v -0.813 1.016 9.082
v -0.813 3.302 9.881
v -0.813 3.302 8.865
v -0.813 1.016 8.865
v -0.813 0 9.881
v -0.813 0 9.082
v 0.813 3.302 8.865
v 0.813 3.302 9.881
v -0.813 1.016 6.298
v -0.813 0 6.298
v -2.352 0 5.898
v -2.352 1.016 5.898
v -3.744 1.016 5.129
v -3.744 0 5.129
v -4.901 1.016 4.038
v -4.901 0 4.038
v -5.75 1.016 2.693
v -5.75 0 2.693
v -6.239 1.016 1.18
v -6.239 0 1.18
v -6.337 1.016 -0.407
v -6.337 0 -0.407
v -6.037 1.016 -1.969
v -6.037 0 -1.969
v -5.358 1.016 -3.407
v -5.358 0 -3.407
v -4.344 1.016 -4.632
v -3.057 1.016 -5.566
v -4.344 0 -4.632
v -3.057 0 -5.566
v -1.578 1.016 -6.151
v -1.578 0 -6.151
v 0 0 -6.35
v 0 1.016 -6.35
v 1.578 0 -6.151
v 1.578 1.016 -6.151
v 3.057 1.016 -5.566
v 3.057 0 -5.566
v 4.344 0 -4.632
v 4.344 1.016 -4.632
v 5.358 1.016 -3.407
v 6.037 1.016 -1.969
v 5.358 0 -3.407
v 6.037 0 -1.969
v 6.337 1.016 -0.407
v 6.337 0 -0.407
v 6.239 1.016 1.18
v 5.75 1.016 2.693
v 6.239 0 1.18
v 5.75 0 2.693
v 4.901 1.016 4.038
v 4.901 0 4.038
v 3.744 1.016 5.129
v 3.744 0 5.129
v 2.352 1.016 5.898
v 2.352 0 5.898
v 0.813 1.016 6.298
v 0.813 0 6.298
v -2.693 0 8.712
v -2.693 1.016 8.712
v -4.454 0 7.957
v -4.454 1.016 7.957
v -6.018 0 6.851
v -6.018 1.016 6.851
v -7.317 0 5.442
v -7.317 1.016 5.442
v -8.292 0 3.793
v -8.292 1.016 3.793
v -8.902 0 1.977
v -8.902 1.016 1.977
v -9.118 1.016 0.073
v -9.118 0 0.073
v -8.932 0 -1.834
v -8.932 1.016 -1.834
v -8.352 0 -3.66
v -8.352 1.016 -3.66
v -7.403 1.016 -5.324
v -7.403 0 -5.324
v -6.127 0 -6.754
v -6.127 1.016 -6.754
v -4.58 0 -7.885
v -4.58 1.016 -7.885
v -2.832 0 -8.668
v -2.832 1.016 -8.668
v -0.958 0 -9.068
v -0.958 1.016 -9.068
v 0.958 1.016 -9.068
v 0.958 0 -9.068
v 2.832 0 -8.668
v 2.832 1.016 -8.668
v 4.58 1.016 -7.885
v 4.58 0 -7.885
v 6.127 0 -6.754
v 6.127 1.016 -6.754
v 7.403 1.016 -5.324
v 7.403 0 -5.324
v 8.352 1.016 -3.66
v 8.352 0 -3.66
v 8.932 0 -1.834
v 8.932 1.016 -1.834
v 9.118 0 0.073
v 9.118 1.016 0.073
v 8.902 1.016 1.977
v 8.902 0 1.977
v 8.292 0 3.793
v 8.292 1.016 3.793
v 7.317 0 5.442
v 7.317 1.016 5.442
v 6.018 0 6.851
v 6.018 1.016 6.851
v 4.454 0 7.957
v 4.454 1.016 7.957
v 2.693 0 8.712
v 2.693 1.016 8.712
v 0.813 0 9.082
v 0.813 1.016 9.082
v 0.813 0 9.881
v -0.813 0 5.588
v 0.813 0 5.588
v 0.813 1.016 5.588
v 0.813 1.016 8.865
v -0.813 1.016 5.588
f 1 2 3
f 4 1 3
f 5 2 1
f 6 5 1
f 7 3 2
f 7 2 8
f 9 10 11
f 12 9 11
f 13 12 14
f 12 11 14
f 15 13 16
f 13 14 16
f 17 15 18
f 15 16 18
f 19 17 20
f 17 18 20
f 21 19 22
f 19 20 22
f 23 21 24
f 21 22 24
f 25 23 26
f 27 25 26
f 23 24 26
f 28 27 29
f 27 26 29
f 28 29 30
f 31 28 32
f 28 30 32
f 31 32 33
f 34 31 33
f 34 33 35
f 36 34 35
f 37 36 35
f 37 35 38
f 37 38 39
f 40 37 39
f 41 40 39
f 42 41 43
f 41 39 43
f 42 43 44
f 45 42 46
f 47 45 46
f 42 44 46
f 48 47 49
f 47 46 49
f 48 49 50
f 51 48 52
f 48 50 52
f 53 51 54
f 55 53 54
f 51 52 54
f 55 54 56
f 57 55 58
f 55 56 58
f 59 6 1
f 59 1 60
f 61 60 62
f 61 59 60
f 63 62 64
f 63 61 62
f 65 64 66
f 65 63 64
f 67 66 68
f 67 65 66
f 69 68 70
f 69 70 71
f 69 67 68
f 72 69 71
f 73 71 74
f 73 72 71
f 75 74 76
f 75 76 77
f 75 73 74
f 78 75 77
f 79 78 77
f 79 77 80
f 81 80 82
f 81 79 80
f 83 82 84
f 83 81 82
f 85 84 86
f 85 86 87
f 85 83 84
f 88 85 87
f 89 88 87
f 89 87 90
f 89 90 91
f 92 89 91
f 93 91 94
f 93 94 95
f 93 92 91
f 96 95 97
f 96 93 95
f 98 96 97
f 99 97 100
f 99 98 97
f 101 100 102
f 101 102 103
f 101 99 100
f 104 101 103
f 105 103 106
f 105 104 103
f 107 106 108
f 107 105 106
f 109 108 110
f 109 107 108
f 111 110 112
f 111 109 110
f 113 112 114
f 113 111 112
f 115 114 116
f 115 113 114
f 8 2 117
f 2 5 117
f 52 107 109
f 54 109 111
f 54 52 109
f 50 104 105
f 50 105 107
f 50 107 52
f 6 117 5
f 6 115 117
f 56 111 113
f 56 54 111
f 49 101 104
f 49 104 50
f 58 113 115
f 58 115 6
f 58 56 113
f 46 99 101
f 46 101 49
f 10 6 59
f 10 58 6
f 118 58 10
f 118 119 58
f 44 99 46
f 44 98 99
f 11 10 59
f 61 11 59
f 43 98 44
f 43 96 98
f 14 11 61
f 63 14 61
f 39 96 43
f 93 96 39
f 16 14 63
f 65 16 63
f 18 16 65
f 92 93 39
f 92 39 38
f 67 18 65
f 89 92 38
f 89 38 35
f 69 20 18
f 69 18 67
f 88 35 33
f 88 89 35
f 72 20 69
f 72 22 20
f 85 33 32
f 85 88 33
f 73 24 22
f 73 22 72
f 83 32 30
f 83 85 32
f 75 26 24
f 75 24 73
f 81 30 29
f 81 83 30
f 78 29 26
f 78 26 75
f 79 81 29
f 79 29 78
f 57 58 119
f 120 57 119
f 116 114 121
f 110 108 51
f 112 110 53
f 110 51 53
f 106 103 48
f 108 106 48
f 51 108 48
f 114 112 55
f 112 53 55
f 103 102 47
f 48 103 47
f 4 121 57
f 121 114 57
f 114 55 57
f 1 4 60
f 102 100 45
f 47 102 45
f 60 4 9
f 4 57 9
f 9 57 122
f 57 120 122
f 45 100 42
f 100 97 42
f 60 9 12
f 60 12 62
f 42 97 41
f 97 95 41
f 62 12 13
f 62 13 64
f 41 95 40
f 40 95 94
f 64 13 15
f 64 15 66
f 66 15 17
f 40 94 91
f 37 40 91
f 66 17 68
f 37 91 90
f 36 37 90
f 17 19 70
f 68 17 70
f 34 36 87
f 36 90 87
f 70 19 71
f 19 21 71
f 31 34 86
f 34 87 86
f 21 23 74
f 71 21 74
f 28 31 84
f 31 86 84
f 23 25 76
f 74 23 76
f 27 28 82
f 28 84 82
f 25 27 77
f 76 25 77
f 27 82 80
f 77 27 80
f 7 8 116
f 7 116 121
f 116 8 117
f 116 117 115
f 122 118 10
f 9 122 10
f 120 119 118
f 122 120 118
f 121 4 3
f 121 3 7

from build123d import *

# Parameters (mm, degrees)
BOSS_EXTRUDE1_DEPTH = 1.016
SKETCH2_W           = 1.6256
SKETCH2_H           = 1.016
BOSS_EXTRUDE2_DEPTH = 2.286


with BuildPart() as part:
    # Sketch1 → Boss-Extrude1 (new body)
    with BuildSketch(Plane(origin=(0, 0, 0), x_dir=(1, 0, 0), z_dir=(0, 1, 0))):
        with BuildLine():
            Line((0.8128, -9.8806), (-0.8128, -9.8806))
            Line((-0.8128, -9.8806), (-0.8128, -9.082302688))
            ThreePointArc((-0.8128, -9.082302688), (0, 9.1186), (0.8128, -9.082302688))
            Line((0.8128, -9.082302688), (0.8128, -9.8806))
        make_face()
        with BuildLine():
            Line((0.8128, -6.297765966), (0.8128, -5.588))
            Line((0.8128, -5.588), (-0.8128, -5.588))
            Line((-0.8128, -5.588), (-0.8128, -6.297765966))
            ThreePointArc((-0.8128, -6.297765966), (0, 6.35), (0.8128, -6.297765966))
        make_face(mode=Mode.SUBTRACT)
    extrude(amount=BOSS_EXTRUDE1_DEPTH)

    # Sketch2 → Boss-Extrude2 (add)
    with BuildSketch(Plane(origin=(0, 1.016, 0), x_dir=(1, 0, 0), z_dir=(0, 1, 0))):
        with Locations((0, -9.3726)):
            Rectangle(SKETCH2_W, SKETCH2_H)
    extrude(amount=BOSS_EXTRUDE2_DEPTH)


solid = part.part
